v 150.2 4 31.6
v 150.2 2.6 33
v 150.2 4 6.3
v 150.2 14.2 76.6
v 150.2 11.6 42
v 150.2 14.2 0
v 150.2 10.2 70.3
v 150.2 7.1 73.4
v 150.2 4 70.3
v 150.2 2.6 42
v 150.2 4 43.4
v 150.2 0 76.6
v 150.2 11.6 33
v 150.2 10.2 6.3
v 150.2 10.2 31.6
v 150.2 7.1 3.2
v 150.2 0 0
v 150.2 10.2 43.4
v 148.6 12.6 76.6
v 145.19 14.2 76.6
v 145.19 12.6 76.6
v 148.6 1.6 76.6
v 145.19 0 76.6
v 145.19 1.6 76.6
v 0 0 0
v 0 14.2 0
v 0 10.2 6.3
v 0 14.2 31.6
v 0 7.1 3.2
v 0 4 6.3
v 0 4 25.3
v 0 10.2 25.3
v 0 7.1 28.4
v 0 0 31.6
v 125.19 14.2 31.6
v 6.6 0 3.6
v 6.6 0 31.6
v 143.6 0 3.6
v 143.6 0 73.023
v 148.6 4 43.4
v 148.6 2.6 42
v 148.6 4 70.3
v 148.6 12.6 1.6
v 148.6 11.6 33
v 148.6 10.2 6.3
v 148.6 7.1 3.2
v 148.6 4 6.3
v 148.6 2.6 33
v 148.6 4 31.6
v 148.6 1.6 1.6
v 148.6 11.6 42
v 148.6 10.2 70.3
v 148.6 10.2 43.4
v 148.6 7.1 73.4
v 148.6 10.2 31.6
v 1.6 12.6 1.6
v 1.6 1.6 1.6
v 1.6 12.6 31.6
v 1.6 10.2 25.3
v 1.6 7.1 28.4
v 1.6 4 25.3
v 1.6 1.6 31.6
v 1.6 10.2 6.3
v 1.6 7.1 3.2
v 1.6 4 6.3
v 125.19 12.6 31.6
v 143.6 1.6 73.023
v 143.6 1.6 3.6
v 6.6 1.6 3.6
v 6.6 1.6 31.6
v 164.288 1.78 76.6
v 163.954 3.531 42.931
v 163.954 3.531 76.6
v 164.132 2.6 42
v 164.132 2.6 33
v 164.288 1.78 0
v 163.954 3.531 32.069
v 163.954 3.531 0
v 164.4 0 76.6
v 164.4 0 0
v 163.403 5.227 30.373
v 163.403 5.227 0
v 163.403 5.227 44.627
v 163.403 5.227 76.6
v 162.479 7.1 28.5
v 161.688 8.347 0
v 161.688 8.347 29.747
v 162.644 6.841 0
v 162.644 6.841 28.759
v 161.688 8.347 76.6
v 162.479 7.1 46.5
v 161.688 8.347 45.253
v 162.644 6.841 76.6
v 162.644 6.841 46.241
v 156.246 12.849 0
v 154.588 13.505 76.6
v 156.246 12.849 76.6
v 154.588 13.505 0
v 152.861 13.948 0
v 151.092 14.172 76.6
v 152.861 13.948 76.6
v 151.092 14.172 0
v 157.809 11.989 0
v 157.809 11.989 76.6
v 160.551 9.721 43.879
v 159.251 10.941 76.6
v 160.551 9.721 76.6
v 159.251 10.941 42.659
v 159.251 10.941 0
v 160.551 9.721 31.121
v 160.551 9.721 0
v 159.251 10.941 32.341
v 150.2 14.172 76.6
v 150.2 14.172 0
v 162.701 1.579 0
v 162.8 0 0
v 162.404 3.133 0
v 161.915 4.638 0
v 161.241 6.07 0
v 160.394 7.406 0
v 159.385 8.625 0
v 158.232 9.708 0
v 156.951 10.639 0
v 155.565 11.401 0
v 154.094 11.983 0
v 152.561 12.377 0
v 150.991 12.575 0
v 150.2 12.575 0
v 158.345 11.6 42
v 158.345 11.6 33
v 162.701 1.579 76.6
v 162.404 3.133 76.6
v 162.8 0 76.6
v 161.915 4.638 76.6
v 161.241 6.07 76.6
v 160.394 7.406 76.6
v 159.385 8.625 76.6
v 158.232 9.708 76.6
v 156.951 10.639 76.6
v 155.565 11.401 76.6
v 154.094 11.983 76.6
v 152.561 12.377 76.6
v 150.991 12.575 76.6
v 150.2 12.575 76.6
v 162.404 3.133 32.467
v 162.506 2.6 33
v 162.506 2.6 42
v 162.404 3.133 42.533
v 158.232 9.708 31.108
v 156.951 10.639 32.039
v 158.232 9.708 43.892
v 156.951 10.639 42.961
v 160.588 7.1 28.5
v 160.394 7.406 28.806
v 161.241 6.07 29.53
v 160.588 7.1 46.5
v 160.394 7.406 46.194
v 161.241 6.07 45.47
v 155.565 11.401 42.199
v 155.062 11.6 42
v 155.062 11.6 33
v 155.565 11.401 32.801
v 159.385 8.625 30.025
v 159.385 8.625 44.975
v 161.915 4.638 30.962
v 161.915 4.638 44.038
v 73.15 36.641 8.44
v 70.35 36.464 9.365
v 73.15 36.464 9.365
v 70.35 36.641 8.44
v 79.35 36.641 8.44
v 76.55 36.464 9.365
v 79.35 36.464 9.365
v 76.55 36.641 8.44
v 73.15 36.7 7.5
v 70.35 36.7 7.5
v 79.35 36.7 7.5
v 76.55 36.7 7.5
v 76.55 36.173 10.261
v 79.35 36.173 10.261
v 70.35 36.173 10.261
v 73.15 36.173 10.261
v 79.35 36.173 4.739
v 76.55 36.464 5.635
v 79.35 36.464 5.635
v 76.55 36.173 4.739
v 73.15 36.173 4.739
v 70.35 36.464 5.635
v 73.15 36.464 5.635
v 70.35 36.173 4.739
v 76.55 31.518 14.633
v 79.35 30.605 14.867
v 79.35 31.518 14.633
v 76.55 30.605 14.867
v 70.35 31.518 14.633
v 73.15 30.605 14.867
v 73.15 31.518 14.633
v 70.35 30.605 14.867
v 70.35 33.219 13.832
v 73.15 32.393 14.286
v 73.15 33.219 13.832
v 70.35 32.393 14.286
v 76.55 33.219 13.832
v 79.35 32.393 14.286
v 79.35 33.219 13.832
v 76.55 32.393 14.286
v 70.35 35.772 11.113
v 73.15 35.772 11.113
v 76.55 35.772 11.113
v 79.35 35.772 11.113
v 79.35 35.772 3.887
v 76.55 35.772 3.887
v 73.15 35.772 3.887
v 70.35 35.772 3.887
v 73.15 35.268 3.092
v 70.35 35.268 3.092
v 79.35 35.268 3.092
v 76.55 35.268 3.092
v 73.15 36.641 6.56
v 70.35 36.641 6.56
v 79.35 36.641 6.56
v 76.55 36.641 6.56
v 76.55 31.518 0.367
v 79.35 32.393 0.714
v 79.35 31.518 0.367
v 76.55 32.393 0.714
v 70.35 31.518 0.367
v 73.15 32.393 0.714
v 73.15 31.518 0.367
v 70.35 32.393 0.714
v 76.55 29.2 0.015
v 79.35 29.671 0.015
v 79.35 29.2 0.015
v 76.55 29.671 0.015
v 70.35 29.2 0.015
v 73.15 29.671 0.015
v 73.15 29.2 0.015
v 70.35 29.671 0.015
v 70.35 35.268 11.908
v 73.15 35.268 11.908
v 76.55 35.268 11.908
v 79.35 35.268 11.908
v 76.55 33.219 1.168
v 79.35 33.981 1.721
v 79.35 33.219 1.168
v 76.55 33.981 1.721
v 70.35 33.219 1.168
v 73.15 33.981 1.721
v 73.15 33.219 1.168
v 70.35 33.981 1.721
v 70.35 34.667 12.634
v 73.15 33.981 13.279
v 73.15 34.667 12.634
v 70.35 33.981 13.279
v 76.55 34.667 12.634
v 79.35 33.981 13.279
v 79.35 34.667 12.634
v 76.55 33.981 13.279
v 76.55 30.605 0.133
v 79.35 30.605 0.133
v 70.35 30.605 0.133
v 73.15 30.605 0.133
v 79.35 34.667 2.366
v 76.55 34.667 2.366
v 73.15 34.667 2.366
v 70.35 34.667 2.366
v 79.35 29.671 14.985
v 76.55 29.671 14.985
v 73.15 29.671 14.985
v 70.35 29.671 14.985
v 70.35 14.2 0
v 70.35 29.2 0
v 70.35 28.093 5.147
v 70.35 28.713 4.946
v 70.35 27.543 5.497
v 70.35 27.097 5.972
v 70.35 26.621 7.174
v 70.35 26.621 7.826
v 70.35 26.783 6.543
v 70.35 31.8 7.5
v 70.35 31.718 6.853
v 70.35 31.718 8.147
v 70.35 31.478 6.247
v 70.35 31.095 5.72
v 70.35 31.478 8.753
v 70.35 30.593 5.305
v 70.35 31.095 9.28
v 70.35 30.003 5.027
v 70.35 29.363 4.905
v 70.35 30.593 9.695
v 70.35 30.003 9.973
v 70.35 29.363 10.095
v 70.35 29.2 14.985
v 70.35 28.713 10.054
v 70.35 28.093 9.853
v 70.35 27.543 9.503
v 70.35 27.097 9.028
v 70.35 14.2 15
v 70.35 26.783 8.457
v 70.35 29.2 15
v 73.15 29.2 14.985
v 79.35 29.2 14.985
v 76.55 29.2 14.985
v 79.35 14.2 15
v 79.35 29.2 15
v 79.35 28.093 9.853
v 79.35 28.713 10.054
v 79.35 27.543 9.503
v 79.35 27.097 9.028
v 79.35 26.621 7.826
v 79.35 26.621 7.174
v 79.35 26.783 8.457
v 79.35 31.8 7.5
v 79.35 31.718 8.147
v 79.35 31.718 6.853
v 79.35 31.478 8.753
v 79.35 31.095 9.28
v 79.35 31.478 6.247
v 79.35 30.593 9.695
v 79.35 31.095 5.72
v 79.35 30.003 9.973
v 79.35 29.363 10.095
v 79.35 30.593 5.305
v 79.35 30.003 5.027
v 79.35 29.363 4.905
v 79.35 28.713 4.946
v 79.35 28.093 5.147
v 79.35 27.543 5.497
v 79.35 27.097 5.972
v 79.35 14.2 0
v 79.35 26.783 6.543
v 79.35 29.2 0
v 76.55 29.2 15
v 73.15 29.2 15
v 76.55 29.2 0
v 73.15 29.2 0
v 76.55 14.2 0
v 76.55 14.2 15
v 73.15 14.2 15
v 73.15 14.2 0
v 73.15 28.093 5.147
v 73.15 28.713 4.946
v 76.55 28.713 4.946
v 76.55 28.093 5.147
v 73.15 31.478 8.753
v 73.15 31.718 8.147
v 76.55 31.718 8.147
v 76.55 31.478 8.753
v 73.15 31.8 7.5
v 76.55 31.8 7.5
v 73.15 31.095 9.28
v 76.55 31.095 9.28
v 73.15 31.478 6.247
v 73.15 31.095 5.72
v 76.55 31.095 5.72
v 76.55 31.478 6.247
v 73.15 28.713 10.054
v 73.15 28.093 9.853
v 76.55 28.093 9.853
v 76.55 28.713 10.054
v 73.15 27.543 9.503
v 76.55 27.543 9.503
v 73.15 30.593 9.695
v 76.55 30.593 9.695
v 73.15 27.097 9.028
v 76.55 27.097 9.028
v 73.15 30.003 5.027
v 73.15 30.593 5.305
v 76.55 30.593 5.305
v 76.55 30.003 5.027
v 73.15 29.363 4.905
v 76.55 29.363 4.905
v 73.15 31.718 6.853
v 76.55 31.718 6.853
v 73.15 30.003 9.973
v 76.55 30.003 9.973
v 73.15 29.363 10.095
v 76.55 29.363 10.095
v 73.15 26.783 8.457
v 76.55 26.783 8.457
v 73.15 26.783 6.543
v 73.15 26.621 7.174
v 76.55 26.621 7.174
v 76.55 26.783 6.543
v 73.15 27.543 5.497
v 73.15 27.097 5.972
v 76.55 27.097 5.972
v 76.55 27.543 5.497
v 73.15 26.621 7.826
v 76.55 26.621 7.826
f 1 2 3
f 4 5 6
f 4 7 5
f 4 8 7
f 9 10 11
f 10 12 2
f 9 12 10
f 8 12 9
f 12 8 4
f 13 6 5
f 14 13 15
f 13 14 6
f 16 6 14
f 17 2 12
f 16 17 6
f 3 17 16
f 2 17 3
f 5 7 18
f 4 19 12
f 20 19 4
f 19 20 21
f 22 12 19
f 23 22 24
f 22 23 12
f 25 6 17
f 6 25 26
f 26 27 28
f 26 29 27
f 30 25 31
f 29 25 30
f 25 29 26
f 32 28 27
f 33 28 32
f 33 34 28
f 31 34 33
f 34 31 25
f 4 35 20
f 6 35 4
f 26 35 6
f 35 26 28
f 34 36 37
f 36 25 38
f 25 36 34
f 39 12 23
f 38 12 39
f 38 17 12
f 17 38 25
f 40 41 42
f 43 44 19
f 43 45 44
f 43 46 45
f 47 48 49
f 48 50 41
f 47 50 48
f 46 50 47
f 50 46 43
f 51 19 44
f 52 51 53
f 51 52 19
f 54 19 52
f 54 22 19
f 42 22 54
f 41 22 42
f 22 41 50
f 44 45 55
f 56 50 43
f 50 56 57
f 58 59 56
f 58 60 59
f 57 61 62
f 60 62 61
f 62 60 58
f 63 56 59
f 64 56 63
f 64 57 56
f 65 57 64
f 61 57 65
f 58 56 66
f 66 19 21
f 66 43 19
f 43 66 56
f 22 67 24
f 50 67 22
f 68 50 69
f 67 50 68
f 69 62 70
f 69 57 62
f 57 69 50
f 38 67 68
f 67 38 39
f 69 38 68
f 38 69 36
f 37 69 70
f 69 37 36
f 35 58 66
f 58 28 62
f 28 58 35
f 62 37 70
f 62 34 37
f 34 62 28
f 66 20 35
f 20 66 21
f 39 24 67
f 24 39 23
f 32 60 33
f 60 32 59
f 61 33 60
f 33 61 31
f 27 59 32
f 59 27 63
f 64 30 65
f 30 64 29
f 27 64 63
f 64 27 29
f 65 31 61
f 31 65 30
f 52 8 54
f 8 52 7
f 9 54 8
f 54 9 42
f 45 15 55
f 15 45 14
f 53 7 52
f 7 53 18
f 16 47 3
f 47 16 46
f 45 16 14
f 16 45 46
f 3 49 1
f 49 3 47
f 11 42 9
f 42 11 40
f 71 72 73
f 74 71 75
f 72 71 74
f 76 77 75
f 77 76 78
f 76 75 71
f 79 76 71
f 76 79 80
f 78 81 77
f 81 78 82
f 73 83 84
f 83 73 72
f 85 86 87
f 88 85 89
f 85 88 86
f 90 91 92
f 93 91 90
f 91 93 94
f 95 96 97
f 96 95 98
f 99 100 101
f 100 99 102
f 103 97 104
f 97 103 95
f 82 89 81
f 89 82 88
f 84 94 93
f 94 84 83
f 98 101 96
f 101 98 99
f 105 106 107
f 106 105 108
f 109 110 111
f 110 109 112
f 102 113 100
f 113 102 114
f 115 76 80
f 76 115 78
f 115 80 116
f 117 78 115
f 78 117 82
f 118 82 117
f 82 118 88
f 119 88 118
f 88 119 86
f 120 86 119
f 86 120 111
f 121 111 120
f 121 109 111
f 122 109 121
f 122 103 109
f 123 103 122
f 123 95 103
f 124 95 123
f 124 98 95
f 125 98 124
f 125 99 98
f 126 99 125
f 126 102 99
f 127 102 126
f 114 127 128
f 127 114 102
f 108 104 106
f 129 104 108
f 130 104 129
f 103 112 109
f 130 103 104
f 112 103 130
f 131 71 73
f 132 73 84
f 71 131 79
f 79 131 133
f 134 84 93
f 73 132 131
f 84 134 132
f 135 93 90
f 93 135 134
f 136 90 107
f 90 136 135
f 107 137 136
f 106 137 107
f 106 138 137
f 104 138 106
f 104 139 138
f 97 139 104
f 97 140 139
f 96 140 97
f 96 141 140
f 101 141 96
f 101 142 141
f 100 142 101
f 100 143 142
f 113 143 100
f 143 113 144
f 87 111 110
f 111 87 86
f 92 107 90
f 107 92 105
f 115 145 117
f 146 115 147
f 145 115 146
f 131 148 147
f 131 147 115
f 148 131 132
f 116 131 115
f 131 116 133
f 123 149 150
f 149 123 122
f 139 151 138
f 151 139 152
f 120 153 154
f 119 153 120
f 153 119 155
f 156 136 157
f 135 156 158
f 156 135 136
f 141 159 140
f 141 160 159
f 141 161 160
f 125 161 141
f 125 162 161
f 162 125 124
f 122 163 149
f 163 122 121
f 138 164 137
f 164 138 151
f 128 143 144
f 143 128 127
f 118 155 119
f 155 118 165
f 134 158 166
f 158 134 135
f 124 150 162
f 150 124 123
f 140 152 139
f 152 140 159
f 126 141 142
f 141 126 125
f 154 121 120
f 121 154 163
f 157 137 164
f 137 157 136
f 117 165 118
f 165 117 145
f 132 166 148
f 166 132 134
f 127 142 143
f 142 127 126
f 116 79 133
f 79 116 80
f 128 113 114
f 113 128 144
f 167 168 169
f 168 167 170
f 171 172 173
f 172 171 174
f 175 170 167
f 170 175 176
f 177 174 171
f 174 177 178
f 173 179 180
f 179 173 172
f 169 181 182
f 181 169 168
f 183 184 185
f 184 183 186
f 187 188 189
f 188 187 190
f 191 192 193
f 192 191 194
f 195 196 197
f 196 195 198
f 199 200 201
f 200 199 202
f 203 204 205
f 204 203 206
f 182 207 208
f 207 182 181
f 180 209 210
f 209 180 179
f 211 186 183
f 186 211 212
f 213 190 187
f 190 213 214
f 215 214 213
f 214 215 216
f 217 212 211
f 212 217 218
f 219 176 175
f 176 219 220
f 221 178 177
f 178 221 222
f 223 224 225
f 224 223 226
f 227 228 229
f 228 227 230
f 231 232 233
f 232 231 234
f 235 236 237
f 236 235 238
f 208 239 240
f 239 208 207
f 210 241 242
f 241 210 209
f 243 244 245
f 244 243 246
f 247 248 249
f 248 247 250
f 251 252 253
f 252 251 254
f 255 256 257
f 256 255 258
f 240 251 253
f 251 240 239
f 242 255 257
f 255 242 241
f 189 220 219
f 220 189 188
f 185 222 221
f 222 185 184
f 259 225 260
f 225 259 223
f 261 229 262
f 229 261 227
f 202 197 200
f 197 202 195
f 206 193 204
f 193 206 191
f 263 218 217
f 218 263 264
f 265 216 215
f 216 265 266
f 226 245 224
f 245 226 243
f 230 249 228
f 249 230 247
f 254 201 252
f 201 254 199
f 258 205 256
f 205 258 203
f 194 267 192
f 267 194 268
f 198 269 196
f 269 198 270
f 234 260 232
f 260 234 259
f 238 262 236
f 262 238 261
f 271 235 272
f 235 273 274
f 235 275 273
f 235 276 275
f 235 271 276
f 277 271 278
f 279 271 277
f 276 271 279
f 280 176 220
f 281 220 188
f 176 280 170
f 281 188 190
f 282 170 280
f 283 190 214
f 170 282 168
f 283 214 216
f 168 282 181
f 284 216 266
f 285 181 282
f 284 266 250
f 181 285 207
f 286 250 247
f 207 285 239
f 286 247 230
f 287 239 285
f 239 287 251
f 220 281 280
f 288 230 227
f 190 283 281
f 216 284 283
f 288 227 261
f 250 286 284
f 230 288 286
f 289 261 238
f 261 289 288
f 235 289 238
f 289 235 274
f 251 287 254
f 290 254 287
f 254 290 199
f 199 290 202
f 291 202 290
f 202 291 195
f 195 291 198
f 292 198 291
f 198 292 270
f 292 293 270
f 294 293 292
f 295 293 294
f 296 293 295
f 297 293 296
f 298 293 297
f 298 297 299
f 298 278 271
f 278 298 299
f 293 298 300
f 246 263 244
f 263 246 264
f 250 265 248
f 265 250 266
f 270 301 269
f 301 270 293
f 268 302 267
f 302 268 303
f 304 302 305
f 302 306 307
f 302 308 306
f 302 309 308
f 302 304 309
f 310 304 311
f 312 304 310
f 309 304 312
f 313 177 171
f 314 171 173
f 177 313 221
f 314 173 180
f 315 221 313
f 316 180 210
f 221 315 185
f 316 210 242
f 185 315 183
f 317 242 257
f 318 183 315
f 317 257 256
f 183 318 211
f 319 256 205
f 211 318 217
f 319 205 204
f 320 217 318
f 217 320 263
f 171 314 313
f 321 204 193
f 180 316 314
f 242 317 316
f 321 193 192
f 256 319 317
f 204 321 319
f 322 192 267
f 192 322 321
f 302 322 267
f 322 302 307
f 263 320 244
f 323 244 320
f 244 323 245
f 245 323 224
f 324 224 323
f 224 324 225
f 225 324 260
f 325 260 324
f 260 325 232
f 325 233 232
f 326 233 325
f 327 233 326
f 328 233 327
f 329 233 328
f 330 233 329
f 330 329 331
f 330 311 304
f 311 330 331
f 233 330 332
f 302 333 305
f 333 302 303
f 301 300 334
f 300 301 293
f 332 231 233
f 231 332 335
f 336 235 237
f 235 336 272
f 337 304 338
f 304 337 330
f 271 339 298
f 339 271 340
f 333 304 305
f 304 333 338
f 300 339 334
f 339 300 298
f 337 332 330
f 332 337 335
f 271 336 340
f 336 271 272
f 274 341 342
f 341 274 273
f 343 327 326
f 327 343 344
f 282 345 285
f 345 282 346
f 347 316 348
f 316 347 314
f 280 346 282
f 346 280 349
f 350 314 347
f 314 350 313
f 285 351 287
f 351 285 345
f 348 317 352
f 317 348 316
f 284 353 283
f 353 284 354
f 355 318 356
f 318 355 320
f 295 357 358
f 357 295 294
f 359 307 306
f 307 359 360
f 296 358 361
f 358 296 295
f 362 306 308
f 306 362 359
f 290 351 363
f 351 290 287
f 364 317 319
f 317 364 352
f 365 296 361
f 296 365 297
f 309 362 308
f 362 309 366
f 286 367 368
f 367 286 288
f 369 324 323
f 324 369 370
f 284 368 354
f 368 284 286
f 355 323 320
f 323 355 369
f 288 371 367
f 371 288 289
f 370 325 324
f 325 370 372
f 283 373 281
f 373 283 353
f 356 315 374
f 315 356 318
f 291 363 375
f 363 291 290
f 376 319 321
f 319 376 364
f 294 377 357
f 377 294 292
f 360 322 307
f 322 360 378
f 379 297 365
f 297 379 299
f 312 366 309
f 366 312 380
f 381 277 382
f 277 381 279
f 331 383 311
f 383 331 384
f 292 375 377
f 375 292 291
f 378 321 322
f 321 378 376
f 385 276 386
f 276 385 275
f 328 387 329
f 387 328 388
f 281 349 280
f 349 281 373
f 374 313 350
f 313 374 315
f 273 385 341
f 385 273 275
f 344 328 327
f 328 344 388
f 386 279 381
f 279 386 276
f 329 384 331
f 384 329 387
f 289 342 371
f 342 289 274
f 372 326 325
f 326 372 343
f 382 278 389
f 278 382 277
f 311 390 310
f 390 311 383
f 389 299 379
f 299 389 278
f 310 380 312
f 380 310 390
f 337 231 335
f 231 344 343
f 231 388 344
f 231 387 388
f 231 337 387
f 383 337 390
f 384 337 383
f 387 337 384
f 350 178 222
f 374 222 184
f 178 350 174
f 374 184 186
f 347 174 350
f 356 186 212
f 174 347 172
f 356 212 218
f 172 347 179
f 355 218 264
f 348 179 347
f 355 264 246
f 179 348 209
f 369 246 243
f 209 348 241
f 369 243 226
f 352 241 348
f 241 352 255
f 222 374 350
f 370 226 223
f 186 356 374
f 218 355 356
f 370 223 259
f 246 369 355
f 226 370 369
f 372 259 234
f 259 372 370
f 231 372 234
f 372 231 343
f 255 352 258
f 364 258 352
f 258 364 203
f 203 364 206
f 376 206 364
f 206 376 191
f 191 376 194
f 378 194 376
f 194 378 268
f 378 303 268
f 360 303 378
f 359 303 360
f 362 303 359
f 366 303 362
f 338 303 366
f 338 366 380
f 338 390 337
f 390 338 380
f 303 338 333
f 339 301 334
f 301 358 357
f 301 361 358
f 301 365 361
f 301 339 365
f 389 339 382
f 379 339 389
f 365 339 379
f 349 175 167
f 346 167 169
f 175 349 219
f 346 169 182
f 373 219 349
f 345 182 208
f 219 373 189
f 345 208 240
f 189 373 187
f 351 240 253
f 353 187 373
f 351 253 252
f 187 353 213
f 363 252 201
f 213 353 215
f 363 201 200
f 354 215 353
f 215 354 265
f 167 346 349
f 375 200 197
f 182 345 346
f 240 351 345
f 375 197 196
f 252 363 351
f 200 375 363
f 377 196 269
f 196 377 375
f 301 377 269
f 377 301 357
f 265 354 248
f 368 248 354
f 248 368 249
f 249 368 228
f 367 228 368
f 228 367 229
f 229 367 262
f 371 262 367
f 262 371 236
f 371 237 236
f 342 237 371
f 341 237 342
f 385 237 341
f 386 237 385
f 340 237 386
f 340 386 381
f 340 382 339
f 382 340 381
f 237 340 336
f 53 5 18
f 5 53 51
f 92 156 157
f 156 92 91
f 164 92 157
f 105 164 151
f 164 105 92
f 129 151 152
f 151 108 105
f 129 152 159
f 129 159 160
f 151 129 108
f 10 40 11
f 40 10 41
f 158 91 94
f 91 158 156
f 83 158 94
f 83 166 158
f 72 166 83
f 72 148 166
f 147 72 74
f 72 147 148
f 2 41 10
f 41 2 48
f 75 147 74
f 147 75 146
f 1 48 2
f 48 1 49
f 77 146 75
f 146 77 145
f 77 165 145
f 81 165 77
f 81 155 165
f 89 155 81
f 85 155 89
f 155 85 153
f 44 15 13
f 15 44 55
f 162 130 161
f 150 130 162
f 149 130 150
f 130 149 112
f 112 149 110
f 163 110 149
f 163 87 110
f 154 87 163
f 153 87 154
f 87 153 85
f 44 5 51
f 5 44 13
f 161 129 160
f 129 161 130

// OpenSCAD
// Phone holder with GoPro Mount
// (c) 2017 Michael Neuendorf <michael@neuendorf-online.de>

/* [General] */
// The phone width in mm
phone_width = 147;
// The phone thickness in mm
phone_thickness = 11;
// The phone height in mm
phone_height = 75;

// Select to generate sound ducts
sound_duct = 2; // [0:none, 1:left, 2:right, 3:both]
// Select to generate a hole for the power cord
power_connector = 1; // [0:no, 1:yes]

/* [Hidden] */
wall_thickness = 1.6;
holder_thickness = phone_thickness + 2 * wall_thickness;
holder_width = phone_width + 2 * wall_thickness;
front_side_border = 5;
front_bottom_border = 2;
back_height = 30;

function left_height() = (sound_duct == 1 || sound_duct == 3) ? phone_height : back_height;
function right_height() = (sound_duct == 2 || sound_duct == 3) ? phone_height : back_height;

// Artifact eliminating offset
a = 0.01;

module boder_cut(l, w = phone_thickness - 3 * wall_thickness, t = wall_thickness + 2 * a) {
    w2 = w / 2;
    linear_extrude(height = t)
    polygon(points = [
        [w2, 0]
        ,[w, w2]
        ,[w, l - w2]
        ,[w2, l]
        ,[0, l - w2]
        ,[0, w2]
    ]);
}

module phone_holder() {
    difference() {
        cube([holder_width, phone_thickness + 2 * wall_thickness, phone_height + wall_thickness]);
        translate([wall_thickness, wall_thickness, wall_thickness])
        cube([phone_width, phone_thickness, phone_height + a]);
        
        // Front cut
        translate([wall_thickness + front_side_border, -a, wall_thickness + front_bottom_border])
        cube([phone_width - 2 * front_side_border, wall_thickness + 2 * a, phone_height - front_bottom_border + a]);
        
        translate([-a, holder_thickness + a, wall_thickness])
        rotate([90, 0, 0])
        linear_extrude(height = holder_thickness + 2 * a)
        polygon(points = [
            [-a, left_height()]
            ,[front_side_border, left_height()]
            ,[front_side_border + 20, back_height]
            ,[holder_width - 20 - front_side_border, back_height]
            ,[holder_width - front_side_border, right_height()]
            ,[holder_width + 2 * a, right_height()]
            ,[holder_width + 2 * a, phone_height + a]
            ,[-a, phone_height + a]
        ]); 
        
        translate([-a, 2.5 * wall_thickness, 2 * wall_thickness])
        rotate([90, 0, 90])
        boder_cut(l = left_height() - 3 * wall_thickness);
        
        translate([holder_width - wall_thickness - a, 2.5 * wall_thickness, 2 * wall_thickness])
        rotate([90, 0, 90])
        boder_cut(l = right_height() - 3 * wall_thickness);
    }
}

module sound_duct(h) {
    difference() {
        cylinder(r = holder_thickness, h = h, $fn = 50);
        
        translate([0, 0, -a])
        cylinder(r = holder_thickness - wall_thickness, h = h + 2*a, $fn = 50);
        
        translate([0, 0, -a])
        linear_extrude(height = h + 2 * a)
        polygon(points = [
            [0, 0]
            ,[holder_thickness + a, 0]
            ,[holder_thickness + a, -holder_thickness - a]
            ,[-holder_thickness - a, -holder_thickness - a]
            ,[-holder_thickness - a, holder_thickness + a]
            ,[0, holder_thickness + a]
        ]);
    }
}

module gopro_mount(a) {
    difference() {
        union() {
            translate([15, 0, 0])
            cylinder(d = 15, h = 9, $fn=50);
            translate([0, -7.5, 0])
            cube([15, 15, 9]);
        }
        
        translate([15, 0, -a])
        cylinder(d = 5.2, h = 9 + 2 * a, $fn=25);
        translate([-a, -7.5 - a, 9 / 2 - 3.4 / 2])
        cube([23, 15 + 2 * a, 3.4]);
    }
}

difference() {
    union() {
        phone_holder();
        
        if (sound_duct == 1 || sound_duct == 3) {
            translate([0, 0, left_height() + wall_thickness])
            rotate([0, 180, 0])
            sound_duct(h = left_height() + wall_thickness);
        }
        
        if (sound_duct == 2 || sound_duct == 3) {
            translate([holder_width, 0, 0])
            sound_duct(h = right_height() + wall_thickness);
        }
        
        translate([holder_width / 2 - 9.5 / 2, holder_thickness, 7.5])
        rotate([90, 0, 90])
        gopro_mount(a);
    }
    
    if (power_connector == 1) {
        if (sound_duct == 1 || sound_duct == 3) {
            translate([-holder_thickness - a, (holder_thickness - 9) / 2, (phone_height - 18) / 2])
            rotate([90, 0, 0])
            rotate([0, 90, 0])
            boder_cut(l = 18, w = 9, t = holder_thickness + wall_thickness + 2*a);
        }

        if (sound_duct == 2 || sound_duct == 3) {
            translate([holder_width - wall_thickness - a, (holder_thickness - 9) / 2, (phone_height - 18) / 2])
            rotate([90, 0, 0])
            rotate([0, 90, 0])
            boder_cut(l = 18, w = 9, t = holder_thickness + wall_thickness + 2*a);
        }
    }
}
